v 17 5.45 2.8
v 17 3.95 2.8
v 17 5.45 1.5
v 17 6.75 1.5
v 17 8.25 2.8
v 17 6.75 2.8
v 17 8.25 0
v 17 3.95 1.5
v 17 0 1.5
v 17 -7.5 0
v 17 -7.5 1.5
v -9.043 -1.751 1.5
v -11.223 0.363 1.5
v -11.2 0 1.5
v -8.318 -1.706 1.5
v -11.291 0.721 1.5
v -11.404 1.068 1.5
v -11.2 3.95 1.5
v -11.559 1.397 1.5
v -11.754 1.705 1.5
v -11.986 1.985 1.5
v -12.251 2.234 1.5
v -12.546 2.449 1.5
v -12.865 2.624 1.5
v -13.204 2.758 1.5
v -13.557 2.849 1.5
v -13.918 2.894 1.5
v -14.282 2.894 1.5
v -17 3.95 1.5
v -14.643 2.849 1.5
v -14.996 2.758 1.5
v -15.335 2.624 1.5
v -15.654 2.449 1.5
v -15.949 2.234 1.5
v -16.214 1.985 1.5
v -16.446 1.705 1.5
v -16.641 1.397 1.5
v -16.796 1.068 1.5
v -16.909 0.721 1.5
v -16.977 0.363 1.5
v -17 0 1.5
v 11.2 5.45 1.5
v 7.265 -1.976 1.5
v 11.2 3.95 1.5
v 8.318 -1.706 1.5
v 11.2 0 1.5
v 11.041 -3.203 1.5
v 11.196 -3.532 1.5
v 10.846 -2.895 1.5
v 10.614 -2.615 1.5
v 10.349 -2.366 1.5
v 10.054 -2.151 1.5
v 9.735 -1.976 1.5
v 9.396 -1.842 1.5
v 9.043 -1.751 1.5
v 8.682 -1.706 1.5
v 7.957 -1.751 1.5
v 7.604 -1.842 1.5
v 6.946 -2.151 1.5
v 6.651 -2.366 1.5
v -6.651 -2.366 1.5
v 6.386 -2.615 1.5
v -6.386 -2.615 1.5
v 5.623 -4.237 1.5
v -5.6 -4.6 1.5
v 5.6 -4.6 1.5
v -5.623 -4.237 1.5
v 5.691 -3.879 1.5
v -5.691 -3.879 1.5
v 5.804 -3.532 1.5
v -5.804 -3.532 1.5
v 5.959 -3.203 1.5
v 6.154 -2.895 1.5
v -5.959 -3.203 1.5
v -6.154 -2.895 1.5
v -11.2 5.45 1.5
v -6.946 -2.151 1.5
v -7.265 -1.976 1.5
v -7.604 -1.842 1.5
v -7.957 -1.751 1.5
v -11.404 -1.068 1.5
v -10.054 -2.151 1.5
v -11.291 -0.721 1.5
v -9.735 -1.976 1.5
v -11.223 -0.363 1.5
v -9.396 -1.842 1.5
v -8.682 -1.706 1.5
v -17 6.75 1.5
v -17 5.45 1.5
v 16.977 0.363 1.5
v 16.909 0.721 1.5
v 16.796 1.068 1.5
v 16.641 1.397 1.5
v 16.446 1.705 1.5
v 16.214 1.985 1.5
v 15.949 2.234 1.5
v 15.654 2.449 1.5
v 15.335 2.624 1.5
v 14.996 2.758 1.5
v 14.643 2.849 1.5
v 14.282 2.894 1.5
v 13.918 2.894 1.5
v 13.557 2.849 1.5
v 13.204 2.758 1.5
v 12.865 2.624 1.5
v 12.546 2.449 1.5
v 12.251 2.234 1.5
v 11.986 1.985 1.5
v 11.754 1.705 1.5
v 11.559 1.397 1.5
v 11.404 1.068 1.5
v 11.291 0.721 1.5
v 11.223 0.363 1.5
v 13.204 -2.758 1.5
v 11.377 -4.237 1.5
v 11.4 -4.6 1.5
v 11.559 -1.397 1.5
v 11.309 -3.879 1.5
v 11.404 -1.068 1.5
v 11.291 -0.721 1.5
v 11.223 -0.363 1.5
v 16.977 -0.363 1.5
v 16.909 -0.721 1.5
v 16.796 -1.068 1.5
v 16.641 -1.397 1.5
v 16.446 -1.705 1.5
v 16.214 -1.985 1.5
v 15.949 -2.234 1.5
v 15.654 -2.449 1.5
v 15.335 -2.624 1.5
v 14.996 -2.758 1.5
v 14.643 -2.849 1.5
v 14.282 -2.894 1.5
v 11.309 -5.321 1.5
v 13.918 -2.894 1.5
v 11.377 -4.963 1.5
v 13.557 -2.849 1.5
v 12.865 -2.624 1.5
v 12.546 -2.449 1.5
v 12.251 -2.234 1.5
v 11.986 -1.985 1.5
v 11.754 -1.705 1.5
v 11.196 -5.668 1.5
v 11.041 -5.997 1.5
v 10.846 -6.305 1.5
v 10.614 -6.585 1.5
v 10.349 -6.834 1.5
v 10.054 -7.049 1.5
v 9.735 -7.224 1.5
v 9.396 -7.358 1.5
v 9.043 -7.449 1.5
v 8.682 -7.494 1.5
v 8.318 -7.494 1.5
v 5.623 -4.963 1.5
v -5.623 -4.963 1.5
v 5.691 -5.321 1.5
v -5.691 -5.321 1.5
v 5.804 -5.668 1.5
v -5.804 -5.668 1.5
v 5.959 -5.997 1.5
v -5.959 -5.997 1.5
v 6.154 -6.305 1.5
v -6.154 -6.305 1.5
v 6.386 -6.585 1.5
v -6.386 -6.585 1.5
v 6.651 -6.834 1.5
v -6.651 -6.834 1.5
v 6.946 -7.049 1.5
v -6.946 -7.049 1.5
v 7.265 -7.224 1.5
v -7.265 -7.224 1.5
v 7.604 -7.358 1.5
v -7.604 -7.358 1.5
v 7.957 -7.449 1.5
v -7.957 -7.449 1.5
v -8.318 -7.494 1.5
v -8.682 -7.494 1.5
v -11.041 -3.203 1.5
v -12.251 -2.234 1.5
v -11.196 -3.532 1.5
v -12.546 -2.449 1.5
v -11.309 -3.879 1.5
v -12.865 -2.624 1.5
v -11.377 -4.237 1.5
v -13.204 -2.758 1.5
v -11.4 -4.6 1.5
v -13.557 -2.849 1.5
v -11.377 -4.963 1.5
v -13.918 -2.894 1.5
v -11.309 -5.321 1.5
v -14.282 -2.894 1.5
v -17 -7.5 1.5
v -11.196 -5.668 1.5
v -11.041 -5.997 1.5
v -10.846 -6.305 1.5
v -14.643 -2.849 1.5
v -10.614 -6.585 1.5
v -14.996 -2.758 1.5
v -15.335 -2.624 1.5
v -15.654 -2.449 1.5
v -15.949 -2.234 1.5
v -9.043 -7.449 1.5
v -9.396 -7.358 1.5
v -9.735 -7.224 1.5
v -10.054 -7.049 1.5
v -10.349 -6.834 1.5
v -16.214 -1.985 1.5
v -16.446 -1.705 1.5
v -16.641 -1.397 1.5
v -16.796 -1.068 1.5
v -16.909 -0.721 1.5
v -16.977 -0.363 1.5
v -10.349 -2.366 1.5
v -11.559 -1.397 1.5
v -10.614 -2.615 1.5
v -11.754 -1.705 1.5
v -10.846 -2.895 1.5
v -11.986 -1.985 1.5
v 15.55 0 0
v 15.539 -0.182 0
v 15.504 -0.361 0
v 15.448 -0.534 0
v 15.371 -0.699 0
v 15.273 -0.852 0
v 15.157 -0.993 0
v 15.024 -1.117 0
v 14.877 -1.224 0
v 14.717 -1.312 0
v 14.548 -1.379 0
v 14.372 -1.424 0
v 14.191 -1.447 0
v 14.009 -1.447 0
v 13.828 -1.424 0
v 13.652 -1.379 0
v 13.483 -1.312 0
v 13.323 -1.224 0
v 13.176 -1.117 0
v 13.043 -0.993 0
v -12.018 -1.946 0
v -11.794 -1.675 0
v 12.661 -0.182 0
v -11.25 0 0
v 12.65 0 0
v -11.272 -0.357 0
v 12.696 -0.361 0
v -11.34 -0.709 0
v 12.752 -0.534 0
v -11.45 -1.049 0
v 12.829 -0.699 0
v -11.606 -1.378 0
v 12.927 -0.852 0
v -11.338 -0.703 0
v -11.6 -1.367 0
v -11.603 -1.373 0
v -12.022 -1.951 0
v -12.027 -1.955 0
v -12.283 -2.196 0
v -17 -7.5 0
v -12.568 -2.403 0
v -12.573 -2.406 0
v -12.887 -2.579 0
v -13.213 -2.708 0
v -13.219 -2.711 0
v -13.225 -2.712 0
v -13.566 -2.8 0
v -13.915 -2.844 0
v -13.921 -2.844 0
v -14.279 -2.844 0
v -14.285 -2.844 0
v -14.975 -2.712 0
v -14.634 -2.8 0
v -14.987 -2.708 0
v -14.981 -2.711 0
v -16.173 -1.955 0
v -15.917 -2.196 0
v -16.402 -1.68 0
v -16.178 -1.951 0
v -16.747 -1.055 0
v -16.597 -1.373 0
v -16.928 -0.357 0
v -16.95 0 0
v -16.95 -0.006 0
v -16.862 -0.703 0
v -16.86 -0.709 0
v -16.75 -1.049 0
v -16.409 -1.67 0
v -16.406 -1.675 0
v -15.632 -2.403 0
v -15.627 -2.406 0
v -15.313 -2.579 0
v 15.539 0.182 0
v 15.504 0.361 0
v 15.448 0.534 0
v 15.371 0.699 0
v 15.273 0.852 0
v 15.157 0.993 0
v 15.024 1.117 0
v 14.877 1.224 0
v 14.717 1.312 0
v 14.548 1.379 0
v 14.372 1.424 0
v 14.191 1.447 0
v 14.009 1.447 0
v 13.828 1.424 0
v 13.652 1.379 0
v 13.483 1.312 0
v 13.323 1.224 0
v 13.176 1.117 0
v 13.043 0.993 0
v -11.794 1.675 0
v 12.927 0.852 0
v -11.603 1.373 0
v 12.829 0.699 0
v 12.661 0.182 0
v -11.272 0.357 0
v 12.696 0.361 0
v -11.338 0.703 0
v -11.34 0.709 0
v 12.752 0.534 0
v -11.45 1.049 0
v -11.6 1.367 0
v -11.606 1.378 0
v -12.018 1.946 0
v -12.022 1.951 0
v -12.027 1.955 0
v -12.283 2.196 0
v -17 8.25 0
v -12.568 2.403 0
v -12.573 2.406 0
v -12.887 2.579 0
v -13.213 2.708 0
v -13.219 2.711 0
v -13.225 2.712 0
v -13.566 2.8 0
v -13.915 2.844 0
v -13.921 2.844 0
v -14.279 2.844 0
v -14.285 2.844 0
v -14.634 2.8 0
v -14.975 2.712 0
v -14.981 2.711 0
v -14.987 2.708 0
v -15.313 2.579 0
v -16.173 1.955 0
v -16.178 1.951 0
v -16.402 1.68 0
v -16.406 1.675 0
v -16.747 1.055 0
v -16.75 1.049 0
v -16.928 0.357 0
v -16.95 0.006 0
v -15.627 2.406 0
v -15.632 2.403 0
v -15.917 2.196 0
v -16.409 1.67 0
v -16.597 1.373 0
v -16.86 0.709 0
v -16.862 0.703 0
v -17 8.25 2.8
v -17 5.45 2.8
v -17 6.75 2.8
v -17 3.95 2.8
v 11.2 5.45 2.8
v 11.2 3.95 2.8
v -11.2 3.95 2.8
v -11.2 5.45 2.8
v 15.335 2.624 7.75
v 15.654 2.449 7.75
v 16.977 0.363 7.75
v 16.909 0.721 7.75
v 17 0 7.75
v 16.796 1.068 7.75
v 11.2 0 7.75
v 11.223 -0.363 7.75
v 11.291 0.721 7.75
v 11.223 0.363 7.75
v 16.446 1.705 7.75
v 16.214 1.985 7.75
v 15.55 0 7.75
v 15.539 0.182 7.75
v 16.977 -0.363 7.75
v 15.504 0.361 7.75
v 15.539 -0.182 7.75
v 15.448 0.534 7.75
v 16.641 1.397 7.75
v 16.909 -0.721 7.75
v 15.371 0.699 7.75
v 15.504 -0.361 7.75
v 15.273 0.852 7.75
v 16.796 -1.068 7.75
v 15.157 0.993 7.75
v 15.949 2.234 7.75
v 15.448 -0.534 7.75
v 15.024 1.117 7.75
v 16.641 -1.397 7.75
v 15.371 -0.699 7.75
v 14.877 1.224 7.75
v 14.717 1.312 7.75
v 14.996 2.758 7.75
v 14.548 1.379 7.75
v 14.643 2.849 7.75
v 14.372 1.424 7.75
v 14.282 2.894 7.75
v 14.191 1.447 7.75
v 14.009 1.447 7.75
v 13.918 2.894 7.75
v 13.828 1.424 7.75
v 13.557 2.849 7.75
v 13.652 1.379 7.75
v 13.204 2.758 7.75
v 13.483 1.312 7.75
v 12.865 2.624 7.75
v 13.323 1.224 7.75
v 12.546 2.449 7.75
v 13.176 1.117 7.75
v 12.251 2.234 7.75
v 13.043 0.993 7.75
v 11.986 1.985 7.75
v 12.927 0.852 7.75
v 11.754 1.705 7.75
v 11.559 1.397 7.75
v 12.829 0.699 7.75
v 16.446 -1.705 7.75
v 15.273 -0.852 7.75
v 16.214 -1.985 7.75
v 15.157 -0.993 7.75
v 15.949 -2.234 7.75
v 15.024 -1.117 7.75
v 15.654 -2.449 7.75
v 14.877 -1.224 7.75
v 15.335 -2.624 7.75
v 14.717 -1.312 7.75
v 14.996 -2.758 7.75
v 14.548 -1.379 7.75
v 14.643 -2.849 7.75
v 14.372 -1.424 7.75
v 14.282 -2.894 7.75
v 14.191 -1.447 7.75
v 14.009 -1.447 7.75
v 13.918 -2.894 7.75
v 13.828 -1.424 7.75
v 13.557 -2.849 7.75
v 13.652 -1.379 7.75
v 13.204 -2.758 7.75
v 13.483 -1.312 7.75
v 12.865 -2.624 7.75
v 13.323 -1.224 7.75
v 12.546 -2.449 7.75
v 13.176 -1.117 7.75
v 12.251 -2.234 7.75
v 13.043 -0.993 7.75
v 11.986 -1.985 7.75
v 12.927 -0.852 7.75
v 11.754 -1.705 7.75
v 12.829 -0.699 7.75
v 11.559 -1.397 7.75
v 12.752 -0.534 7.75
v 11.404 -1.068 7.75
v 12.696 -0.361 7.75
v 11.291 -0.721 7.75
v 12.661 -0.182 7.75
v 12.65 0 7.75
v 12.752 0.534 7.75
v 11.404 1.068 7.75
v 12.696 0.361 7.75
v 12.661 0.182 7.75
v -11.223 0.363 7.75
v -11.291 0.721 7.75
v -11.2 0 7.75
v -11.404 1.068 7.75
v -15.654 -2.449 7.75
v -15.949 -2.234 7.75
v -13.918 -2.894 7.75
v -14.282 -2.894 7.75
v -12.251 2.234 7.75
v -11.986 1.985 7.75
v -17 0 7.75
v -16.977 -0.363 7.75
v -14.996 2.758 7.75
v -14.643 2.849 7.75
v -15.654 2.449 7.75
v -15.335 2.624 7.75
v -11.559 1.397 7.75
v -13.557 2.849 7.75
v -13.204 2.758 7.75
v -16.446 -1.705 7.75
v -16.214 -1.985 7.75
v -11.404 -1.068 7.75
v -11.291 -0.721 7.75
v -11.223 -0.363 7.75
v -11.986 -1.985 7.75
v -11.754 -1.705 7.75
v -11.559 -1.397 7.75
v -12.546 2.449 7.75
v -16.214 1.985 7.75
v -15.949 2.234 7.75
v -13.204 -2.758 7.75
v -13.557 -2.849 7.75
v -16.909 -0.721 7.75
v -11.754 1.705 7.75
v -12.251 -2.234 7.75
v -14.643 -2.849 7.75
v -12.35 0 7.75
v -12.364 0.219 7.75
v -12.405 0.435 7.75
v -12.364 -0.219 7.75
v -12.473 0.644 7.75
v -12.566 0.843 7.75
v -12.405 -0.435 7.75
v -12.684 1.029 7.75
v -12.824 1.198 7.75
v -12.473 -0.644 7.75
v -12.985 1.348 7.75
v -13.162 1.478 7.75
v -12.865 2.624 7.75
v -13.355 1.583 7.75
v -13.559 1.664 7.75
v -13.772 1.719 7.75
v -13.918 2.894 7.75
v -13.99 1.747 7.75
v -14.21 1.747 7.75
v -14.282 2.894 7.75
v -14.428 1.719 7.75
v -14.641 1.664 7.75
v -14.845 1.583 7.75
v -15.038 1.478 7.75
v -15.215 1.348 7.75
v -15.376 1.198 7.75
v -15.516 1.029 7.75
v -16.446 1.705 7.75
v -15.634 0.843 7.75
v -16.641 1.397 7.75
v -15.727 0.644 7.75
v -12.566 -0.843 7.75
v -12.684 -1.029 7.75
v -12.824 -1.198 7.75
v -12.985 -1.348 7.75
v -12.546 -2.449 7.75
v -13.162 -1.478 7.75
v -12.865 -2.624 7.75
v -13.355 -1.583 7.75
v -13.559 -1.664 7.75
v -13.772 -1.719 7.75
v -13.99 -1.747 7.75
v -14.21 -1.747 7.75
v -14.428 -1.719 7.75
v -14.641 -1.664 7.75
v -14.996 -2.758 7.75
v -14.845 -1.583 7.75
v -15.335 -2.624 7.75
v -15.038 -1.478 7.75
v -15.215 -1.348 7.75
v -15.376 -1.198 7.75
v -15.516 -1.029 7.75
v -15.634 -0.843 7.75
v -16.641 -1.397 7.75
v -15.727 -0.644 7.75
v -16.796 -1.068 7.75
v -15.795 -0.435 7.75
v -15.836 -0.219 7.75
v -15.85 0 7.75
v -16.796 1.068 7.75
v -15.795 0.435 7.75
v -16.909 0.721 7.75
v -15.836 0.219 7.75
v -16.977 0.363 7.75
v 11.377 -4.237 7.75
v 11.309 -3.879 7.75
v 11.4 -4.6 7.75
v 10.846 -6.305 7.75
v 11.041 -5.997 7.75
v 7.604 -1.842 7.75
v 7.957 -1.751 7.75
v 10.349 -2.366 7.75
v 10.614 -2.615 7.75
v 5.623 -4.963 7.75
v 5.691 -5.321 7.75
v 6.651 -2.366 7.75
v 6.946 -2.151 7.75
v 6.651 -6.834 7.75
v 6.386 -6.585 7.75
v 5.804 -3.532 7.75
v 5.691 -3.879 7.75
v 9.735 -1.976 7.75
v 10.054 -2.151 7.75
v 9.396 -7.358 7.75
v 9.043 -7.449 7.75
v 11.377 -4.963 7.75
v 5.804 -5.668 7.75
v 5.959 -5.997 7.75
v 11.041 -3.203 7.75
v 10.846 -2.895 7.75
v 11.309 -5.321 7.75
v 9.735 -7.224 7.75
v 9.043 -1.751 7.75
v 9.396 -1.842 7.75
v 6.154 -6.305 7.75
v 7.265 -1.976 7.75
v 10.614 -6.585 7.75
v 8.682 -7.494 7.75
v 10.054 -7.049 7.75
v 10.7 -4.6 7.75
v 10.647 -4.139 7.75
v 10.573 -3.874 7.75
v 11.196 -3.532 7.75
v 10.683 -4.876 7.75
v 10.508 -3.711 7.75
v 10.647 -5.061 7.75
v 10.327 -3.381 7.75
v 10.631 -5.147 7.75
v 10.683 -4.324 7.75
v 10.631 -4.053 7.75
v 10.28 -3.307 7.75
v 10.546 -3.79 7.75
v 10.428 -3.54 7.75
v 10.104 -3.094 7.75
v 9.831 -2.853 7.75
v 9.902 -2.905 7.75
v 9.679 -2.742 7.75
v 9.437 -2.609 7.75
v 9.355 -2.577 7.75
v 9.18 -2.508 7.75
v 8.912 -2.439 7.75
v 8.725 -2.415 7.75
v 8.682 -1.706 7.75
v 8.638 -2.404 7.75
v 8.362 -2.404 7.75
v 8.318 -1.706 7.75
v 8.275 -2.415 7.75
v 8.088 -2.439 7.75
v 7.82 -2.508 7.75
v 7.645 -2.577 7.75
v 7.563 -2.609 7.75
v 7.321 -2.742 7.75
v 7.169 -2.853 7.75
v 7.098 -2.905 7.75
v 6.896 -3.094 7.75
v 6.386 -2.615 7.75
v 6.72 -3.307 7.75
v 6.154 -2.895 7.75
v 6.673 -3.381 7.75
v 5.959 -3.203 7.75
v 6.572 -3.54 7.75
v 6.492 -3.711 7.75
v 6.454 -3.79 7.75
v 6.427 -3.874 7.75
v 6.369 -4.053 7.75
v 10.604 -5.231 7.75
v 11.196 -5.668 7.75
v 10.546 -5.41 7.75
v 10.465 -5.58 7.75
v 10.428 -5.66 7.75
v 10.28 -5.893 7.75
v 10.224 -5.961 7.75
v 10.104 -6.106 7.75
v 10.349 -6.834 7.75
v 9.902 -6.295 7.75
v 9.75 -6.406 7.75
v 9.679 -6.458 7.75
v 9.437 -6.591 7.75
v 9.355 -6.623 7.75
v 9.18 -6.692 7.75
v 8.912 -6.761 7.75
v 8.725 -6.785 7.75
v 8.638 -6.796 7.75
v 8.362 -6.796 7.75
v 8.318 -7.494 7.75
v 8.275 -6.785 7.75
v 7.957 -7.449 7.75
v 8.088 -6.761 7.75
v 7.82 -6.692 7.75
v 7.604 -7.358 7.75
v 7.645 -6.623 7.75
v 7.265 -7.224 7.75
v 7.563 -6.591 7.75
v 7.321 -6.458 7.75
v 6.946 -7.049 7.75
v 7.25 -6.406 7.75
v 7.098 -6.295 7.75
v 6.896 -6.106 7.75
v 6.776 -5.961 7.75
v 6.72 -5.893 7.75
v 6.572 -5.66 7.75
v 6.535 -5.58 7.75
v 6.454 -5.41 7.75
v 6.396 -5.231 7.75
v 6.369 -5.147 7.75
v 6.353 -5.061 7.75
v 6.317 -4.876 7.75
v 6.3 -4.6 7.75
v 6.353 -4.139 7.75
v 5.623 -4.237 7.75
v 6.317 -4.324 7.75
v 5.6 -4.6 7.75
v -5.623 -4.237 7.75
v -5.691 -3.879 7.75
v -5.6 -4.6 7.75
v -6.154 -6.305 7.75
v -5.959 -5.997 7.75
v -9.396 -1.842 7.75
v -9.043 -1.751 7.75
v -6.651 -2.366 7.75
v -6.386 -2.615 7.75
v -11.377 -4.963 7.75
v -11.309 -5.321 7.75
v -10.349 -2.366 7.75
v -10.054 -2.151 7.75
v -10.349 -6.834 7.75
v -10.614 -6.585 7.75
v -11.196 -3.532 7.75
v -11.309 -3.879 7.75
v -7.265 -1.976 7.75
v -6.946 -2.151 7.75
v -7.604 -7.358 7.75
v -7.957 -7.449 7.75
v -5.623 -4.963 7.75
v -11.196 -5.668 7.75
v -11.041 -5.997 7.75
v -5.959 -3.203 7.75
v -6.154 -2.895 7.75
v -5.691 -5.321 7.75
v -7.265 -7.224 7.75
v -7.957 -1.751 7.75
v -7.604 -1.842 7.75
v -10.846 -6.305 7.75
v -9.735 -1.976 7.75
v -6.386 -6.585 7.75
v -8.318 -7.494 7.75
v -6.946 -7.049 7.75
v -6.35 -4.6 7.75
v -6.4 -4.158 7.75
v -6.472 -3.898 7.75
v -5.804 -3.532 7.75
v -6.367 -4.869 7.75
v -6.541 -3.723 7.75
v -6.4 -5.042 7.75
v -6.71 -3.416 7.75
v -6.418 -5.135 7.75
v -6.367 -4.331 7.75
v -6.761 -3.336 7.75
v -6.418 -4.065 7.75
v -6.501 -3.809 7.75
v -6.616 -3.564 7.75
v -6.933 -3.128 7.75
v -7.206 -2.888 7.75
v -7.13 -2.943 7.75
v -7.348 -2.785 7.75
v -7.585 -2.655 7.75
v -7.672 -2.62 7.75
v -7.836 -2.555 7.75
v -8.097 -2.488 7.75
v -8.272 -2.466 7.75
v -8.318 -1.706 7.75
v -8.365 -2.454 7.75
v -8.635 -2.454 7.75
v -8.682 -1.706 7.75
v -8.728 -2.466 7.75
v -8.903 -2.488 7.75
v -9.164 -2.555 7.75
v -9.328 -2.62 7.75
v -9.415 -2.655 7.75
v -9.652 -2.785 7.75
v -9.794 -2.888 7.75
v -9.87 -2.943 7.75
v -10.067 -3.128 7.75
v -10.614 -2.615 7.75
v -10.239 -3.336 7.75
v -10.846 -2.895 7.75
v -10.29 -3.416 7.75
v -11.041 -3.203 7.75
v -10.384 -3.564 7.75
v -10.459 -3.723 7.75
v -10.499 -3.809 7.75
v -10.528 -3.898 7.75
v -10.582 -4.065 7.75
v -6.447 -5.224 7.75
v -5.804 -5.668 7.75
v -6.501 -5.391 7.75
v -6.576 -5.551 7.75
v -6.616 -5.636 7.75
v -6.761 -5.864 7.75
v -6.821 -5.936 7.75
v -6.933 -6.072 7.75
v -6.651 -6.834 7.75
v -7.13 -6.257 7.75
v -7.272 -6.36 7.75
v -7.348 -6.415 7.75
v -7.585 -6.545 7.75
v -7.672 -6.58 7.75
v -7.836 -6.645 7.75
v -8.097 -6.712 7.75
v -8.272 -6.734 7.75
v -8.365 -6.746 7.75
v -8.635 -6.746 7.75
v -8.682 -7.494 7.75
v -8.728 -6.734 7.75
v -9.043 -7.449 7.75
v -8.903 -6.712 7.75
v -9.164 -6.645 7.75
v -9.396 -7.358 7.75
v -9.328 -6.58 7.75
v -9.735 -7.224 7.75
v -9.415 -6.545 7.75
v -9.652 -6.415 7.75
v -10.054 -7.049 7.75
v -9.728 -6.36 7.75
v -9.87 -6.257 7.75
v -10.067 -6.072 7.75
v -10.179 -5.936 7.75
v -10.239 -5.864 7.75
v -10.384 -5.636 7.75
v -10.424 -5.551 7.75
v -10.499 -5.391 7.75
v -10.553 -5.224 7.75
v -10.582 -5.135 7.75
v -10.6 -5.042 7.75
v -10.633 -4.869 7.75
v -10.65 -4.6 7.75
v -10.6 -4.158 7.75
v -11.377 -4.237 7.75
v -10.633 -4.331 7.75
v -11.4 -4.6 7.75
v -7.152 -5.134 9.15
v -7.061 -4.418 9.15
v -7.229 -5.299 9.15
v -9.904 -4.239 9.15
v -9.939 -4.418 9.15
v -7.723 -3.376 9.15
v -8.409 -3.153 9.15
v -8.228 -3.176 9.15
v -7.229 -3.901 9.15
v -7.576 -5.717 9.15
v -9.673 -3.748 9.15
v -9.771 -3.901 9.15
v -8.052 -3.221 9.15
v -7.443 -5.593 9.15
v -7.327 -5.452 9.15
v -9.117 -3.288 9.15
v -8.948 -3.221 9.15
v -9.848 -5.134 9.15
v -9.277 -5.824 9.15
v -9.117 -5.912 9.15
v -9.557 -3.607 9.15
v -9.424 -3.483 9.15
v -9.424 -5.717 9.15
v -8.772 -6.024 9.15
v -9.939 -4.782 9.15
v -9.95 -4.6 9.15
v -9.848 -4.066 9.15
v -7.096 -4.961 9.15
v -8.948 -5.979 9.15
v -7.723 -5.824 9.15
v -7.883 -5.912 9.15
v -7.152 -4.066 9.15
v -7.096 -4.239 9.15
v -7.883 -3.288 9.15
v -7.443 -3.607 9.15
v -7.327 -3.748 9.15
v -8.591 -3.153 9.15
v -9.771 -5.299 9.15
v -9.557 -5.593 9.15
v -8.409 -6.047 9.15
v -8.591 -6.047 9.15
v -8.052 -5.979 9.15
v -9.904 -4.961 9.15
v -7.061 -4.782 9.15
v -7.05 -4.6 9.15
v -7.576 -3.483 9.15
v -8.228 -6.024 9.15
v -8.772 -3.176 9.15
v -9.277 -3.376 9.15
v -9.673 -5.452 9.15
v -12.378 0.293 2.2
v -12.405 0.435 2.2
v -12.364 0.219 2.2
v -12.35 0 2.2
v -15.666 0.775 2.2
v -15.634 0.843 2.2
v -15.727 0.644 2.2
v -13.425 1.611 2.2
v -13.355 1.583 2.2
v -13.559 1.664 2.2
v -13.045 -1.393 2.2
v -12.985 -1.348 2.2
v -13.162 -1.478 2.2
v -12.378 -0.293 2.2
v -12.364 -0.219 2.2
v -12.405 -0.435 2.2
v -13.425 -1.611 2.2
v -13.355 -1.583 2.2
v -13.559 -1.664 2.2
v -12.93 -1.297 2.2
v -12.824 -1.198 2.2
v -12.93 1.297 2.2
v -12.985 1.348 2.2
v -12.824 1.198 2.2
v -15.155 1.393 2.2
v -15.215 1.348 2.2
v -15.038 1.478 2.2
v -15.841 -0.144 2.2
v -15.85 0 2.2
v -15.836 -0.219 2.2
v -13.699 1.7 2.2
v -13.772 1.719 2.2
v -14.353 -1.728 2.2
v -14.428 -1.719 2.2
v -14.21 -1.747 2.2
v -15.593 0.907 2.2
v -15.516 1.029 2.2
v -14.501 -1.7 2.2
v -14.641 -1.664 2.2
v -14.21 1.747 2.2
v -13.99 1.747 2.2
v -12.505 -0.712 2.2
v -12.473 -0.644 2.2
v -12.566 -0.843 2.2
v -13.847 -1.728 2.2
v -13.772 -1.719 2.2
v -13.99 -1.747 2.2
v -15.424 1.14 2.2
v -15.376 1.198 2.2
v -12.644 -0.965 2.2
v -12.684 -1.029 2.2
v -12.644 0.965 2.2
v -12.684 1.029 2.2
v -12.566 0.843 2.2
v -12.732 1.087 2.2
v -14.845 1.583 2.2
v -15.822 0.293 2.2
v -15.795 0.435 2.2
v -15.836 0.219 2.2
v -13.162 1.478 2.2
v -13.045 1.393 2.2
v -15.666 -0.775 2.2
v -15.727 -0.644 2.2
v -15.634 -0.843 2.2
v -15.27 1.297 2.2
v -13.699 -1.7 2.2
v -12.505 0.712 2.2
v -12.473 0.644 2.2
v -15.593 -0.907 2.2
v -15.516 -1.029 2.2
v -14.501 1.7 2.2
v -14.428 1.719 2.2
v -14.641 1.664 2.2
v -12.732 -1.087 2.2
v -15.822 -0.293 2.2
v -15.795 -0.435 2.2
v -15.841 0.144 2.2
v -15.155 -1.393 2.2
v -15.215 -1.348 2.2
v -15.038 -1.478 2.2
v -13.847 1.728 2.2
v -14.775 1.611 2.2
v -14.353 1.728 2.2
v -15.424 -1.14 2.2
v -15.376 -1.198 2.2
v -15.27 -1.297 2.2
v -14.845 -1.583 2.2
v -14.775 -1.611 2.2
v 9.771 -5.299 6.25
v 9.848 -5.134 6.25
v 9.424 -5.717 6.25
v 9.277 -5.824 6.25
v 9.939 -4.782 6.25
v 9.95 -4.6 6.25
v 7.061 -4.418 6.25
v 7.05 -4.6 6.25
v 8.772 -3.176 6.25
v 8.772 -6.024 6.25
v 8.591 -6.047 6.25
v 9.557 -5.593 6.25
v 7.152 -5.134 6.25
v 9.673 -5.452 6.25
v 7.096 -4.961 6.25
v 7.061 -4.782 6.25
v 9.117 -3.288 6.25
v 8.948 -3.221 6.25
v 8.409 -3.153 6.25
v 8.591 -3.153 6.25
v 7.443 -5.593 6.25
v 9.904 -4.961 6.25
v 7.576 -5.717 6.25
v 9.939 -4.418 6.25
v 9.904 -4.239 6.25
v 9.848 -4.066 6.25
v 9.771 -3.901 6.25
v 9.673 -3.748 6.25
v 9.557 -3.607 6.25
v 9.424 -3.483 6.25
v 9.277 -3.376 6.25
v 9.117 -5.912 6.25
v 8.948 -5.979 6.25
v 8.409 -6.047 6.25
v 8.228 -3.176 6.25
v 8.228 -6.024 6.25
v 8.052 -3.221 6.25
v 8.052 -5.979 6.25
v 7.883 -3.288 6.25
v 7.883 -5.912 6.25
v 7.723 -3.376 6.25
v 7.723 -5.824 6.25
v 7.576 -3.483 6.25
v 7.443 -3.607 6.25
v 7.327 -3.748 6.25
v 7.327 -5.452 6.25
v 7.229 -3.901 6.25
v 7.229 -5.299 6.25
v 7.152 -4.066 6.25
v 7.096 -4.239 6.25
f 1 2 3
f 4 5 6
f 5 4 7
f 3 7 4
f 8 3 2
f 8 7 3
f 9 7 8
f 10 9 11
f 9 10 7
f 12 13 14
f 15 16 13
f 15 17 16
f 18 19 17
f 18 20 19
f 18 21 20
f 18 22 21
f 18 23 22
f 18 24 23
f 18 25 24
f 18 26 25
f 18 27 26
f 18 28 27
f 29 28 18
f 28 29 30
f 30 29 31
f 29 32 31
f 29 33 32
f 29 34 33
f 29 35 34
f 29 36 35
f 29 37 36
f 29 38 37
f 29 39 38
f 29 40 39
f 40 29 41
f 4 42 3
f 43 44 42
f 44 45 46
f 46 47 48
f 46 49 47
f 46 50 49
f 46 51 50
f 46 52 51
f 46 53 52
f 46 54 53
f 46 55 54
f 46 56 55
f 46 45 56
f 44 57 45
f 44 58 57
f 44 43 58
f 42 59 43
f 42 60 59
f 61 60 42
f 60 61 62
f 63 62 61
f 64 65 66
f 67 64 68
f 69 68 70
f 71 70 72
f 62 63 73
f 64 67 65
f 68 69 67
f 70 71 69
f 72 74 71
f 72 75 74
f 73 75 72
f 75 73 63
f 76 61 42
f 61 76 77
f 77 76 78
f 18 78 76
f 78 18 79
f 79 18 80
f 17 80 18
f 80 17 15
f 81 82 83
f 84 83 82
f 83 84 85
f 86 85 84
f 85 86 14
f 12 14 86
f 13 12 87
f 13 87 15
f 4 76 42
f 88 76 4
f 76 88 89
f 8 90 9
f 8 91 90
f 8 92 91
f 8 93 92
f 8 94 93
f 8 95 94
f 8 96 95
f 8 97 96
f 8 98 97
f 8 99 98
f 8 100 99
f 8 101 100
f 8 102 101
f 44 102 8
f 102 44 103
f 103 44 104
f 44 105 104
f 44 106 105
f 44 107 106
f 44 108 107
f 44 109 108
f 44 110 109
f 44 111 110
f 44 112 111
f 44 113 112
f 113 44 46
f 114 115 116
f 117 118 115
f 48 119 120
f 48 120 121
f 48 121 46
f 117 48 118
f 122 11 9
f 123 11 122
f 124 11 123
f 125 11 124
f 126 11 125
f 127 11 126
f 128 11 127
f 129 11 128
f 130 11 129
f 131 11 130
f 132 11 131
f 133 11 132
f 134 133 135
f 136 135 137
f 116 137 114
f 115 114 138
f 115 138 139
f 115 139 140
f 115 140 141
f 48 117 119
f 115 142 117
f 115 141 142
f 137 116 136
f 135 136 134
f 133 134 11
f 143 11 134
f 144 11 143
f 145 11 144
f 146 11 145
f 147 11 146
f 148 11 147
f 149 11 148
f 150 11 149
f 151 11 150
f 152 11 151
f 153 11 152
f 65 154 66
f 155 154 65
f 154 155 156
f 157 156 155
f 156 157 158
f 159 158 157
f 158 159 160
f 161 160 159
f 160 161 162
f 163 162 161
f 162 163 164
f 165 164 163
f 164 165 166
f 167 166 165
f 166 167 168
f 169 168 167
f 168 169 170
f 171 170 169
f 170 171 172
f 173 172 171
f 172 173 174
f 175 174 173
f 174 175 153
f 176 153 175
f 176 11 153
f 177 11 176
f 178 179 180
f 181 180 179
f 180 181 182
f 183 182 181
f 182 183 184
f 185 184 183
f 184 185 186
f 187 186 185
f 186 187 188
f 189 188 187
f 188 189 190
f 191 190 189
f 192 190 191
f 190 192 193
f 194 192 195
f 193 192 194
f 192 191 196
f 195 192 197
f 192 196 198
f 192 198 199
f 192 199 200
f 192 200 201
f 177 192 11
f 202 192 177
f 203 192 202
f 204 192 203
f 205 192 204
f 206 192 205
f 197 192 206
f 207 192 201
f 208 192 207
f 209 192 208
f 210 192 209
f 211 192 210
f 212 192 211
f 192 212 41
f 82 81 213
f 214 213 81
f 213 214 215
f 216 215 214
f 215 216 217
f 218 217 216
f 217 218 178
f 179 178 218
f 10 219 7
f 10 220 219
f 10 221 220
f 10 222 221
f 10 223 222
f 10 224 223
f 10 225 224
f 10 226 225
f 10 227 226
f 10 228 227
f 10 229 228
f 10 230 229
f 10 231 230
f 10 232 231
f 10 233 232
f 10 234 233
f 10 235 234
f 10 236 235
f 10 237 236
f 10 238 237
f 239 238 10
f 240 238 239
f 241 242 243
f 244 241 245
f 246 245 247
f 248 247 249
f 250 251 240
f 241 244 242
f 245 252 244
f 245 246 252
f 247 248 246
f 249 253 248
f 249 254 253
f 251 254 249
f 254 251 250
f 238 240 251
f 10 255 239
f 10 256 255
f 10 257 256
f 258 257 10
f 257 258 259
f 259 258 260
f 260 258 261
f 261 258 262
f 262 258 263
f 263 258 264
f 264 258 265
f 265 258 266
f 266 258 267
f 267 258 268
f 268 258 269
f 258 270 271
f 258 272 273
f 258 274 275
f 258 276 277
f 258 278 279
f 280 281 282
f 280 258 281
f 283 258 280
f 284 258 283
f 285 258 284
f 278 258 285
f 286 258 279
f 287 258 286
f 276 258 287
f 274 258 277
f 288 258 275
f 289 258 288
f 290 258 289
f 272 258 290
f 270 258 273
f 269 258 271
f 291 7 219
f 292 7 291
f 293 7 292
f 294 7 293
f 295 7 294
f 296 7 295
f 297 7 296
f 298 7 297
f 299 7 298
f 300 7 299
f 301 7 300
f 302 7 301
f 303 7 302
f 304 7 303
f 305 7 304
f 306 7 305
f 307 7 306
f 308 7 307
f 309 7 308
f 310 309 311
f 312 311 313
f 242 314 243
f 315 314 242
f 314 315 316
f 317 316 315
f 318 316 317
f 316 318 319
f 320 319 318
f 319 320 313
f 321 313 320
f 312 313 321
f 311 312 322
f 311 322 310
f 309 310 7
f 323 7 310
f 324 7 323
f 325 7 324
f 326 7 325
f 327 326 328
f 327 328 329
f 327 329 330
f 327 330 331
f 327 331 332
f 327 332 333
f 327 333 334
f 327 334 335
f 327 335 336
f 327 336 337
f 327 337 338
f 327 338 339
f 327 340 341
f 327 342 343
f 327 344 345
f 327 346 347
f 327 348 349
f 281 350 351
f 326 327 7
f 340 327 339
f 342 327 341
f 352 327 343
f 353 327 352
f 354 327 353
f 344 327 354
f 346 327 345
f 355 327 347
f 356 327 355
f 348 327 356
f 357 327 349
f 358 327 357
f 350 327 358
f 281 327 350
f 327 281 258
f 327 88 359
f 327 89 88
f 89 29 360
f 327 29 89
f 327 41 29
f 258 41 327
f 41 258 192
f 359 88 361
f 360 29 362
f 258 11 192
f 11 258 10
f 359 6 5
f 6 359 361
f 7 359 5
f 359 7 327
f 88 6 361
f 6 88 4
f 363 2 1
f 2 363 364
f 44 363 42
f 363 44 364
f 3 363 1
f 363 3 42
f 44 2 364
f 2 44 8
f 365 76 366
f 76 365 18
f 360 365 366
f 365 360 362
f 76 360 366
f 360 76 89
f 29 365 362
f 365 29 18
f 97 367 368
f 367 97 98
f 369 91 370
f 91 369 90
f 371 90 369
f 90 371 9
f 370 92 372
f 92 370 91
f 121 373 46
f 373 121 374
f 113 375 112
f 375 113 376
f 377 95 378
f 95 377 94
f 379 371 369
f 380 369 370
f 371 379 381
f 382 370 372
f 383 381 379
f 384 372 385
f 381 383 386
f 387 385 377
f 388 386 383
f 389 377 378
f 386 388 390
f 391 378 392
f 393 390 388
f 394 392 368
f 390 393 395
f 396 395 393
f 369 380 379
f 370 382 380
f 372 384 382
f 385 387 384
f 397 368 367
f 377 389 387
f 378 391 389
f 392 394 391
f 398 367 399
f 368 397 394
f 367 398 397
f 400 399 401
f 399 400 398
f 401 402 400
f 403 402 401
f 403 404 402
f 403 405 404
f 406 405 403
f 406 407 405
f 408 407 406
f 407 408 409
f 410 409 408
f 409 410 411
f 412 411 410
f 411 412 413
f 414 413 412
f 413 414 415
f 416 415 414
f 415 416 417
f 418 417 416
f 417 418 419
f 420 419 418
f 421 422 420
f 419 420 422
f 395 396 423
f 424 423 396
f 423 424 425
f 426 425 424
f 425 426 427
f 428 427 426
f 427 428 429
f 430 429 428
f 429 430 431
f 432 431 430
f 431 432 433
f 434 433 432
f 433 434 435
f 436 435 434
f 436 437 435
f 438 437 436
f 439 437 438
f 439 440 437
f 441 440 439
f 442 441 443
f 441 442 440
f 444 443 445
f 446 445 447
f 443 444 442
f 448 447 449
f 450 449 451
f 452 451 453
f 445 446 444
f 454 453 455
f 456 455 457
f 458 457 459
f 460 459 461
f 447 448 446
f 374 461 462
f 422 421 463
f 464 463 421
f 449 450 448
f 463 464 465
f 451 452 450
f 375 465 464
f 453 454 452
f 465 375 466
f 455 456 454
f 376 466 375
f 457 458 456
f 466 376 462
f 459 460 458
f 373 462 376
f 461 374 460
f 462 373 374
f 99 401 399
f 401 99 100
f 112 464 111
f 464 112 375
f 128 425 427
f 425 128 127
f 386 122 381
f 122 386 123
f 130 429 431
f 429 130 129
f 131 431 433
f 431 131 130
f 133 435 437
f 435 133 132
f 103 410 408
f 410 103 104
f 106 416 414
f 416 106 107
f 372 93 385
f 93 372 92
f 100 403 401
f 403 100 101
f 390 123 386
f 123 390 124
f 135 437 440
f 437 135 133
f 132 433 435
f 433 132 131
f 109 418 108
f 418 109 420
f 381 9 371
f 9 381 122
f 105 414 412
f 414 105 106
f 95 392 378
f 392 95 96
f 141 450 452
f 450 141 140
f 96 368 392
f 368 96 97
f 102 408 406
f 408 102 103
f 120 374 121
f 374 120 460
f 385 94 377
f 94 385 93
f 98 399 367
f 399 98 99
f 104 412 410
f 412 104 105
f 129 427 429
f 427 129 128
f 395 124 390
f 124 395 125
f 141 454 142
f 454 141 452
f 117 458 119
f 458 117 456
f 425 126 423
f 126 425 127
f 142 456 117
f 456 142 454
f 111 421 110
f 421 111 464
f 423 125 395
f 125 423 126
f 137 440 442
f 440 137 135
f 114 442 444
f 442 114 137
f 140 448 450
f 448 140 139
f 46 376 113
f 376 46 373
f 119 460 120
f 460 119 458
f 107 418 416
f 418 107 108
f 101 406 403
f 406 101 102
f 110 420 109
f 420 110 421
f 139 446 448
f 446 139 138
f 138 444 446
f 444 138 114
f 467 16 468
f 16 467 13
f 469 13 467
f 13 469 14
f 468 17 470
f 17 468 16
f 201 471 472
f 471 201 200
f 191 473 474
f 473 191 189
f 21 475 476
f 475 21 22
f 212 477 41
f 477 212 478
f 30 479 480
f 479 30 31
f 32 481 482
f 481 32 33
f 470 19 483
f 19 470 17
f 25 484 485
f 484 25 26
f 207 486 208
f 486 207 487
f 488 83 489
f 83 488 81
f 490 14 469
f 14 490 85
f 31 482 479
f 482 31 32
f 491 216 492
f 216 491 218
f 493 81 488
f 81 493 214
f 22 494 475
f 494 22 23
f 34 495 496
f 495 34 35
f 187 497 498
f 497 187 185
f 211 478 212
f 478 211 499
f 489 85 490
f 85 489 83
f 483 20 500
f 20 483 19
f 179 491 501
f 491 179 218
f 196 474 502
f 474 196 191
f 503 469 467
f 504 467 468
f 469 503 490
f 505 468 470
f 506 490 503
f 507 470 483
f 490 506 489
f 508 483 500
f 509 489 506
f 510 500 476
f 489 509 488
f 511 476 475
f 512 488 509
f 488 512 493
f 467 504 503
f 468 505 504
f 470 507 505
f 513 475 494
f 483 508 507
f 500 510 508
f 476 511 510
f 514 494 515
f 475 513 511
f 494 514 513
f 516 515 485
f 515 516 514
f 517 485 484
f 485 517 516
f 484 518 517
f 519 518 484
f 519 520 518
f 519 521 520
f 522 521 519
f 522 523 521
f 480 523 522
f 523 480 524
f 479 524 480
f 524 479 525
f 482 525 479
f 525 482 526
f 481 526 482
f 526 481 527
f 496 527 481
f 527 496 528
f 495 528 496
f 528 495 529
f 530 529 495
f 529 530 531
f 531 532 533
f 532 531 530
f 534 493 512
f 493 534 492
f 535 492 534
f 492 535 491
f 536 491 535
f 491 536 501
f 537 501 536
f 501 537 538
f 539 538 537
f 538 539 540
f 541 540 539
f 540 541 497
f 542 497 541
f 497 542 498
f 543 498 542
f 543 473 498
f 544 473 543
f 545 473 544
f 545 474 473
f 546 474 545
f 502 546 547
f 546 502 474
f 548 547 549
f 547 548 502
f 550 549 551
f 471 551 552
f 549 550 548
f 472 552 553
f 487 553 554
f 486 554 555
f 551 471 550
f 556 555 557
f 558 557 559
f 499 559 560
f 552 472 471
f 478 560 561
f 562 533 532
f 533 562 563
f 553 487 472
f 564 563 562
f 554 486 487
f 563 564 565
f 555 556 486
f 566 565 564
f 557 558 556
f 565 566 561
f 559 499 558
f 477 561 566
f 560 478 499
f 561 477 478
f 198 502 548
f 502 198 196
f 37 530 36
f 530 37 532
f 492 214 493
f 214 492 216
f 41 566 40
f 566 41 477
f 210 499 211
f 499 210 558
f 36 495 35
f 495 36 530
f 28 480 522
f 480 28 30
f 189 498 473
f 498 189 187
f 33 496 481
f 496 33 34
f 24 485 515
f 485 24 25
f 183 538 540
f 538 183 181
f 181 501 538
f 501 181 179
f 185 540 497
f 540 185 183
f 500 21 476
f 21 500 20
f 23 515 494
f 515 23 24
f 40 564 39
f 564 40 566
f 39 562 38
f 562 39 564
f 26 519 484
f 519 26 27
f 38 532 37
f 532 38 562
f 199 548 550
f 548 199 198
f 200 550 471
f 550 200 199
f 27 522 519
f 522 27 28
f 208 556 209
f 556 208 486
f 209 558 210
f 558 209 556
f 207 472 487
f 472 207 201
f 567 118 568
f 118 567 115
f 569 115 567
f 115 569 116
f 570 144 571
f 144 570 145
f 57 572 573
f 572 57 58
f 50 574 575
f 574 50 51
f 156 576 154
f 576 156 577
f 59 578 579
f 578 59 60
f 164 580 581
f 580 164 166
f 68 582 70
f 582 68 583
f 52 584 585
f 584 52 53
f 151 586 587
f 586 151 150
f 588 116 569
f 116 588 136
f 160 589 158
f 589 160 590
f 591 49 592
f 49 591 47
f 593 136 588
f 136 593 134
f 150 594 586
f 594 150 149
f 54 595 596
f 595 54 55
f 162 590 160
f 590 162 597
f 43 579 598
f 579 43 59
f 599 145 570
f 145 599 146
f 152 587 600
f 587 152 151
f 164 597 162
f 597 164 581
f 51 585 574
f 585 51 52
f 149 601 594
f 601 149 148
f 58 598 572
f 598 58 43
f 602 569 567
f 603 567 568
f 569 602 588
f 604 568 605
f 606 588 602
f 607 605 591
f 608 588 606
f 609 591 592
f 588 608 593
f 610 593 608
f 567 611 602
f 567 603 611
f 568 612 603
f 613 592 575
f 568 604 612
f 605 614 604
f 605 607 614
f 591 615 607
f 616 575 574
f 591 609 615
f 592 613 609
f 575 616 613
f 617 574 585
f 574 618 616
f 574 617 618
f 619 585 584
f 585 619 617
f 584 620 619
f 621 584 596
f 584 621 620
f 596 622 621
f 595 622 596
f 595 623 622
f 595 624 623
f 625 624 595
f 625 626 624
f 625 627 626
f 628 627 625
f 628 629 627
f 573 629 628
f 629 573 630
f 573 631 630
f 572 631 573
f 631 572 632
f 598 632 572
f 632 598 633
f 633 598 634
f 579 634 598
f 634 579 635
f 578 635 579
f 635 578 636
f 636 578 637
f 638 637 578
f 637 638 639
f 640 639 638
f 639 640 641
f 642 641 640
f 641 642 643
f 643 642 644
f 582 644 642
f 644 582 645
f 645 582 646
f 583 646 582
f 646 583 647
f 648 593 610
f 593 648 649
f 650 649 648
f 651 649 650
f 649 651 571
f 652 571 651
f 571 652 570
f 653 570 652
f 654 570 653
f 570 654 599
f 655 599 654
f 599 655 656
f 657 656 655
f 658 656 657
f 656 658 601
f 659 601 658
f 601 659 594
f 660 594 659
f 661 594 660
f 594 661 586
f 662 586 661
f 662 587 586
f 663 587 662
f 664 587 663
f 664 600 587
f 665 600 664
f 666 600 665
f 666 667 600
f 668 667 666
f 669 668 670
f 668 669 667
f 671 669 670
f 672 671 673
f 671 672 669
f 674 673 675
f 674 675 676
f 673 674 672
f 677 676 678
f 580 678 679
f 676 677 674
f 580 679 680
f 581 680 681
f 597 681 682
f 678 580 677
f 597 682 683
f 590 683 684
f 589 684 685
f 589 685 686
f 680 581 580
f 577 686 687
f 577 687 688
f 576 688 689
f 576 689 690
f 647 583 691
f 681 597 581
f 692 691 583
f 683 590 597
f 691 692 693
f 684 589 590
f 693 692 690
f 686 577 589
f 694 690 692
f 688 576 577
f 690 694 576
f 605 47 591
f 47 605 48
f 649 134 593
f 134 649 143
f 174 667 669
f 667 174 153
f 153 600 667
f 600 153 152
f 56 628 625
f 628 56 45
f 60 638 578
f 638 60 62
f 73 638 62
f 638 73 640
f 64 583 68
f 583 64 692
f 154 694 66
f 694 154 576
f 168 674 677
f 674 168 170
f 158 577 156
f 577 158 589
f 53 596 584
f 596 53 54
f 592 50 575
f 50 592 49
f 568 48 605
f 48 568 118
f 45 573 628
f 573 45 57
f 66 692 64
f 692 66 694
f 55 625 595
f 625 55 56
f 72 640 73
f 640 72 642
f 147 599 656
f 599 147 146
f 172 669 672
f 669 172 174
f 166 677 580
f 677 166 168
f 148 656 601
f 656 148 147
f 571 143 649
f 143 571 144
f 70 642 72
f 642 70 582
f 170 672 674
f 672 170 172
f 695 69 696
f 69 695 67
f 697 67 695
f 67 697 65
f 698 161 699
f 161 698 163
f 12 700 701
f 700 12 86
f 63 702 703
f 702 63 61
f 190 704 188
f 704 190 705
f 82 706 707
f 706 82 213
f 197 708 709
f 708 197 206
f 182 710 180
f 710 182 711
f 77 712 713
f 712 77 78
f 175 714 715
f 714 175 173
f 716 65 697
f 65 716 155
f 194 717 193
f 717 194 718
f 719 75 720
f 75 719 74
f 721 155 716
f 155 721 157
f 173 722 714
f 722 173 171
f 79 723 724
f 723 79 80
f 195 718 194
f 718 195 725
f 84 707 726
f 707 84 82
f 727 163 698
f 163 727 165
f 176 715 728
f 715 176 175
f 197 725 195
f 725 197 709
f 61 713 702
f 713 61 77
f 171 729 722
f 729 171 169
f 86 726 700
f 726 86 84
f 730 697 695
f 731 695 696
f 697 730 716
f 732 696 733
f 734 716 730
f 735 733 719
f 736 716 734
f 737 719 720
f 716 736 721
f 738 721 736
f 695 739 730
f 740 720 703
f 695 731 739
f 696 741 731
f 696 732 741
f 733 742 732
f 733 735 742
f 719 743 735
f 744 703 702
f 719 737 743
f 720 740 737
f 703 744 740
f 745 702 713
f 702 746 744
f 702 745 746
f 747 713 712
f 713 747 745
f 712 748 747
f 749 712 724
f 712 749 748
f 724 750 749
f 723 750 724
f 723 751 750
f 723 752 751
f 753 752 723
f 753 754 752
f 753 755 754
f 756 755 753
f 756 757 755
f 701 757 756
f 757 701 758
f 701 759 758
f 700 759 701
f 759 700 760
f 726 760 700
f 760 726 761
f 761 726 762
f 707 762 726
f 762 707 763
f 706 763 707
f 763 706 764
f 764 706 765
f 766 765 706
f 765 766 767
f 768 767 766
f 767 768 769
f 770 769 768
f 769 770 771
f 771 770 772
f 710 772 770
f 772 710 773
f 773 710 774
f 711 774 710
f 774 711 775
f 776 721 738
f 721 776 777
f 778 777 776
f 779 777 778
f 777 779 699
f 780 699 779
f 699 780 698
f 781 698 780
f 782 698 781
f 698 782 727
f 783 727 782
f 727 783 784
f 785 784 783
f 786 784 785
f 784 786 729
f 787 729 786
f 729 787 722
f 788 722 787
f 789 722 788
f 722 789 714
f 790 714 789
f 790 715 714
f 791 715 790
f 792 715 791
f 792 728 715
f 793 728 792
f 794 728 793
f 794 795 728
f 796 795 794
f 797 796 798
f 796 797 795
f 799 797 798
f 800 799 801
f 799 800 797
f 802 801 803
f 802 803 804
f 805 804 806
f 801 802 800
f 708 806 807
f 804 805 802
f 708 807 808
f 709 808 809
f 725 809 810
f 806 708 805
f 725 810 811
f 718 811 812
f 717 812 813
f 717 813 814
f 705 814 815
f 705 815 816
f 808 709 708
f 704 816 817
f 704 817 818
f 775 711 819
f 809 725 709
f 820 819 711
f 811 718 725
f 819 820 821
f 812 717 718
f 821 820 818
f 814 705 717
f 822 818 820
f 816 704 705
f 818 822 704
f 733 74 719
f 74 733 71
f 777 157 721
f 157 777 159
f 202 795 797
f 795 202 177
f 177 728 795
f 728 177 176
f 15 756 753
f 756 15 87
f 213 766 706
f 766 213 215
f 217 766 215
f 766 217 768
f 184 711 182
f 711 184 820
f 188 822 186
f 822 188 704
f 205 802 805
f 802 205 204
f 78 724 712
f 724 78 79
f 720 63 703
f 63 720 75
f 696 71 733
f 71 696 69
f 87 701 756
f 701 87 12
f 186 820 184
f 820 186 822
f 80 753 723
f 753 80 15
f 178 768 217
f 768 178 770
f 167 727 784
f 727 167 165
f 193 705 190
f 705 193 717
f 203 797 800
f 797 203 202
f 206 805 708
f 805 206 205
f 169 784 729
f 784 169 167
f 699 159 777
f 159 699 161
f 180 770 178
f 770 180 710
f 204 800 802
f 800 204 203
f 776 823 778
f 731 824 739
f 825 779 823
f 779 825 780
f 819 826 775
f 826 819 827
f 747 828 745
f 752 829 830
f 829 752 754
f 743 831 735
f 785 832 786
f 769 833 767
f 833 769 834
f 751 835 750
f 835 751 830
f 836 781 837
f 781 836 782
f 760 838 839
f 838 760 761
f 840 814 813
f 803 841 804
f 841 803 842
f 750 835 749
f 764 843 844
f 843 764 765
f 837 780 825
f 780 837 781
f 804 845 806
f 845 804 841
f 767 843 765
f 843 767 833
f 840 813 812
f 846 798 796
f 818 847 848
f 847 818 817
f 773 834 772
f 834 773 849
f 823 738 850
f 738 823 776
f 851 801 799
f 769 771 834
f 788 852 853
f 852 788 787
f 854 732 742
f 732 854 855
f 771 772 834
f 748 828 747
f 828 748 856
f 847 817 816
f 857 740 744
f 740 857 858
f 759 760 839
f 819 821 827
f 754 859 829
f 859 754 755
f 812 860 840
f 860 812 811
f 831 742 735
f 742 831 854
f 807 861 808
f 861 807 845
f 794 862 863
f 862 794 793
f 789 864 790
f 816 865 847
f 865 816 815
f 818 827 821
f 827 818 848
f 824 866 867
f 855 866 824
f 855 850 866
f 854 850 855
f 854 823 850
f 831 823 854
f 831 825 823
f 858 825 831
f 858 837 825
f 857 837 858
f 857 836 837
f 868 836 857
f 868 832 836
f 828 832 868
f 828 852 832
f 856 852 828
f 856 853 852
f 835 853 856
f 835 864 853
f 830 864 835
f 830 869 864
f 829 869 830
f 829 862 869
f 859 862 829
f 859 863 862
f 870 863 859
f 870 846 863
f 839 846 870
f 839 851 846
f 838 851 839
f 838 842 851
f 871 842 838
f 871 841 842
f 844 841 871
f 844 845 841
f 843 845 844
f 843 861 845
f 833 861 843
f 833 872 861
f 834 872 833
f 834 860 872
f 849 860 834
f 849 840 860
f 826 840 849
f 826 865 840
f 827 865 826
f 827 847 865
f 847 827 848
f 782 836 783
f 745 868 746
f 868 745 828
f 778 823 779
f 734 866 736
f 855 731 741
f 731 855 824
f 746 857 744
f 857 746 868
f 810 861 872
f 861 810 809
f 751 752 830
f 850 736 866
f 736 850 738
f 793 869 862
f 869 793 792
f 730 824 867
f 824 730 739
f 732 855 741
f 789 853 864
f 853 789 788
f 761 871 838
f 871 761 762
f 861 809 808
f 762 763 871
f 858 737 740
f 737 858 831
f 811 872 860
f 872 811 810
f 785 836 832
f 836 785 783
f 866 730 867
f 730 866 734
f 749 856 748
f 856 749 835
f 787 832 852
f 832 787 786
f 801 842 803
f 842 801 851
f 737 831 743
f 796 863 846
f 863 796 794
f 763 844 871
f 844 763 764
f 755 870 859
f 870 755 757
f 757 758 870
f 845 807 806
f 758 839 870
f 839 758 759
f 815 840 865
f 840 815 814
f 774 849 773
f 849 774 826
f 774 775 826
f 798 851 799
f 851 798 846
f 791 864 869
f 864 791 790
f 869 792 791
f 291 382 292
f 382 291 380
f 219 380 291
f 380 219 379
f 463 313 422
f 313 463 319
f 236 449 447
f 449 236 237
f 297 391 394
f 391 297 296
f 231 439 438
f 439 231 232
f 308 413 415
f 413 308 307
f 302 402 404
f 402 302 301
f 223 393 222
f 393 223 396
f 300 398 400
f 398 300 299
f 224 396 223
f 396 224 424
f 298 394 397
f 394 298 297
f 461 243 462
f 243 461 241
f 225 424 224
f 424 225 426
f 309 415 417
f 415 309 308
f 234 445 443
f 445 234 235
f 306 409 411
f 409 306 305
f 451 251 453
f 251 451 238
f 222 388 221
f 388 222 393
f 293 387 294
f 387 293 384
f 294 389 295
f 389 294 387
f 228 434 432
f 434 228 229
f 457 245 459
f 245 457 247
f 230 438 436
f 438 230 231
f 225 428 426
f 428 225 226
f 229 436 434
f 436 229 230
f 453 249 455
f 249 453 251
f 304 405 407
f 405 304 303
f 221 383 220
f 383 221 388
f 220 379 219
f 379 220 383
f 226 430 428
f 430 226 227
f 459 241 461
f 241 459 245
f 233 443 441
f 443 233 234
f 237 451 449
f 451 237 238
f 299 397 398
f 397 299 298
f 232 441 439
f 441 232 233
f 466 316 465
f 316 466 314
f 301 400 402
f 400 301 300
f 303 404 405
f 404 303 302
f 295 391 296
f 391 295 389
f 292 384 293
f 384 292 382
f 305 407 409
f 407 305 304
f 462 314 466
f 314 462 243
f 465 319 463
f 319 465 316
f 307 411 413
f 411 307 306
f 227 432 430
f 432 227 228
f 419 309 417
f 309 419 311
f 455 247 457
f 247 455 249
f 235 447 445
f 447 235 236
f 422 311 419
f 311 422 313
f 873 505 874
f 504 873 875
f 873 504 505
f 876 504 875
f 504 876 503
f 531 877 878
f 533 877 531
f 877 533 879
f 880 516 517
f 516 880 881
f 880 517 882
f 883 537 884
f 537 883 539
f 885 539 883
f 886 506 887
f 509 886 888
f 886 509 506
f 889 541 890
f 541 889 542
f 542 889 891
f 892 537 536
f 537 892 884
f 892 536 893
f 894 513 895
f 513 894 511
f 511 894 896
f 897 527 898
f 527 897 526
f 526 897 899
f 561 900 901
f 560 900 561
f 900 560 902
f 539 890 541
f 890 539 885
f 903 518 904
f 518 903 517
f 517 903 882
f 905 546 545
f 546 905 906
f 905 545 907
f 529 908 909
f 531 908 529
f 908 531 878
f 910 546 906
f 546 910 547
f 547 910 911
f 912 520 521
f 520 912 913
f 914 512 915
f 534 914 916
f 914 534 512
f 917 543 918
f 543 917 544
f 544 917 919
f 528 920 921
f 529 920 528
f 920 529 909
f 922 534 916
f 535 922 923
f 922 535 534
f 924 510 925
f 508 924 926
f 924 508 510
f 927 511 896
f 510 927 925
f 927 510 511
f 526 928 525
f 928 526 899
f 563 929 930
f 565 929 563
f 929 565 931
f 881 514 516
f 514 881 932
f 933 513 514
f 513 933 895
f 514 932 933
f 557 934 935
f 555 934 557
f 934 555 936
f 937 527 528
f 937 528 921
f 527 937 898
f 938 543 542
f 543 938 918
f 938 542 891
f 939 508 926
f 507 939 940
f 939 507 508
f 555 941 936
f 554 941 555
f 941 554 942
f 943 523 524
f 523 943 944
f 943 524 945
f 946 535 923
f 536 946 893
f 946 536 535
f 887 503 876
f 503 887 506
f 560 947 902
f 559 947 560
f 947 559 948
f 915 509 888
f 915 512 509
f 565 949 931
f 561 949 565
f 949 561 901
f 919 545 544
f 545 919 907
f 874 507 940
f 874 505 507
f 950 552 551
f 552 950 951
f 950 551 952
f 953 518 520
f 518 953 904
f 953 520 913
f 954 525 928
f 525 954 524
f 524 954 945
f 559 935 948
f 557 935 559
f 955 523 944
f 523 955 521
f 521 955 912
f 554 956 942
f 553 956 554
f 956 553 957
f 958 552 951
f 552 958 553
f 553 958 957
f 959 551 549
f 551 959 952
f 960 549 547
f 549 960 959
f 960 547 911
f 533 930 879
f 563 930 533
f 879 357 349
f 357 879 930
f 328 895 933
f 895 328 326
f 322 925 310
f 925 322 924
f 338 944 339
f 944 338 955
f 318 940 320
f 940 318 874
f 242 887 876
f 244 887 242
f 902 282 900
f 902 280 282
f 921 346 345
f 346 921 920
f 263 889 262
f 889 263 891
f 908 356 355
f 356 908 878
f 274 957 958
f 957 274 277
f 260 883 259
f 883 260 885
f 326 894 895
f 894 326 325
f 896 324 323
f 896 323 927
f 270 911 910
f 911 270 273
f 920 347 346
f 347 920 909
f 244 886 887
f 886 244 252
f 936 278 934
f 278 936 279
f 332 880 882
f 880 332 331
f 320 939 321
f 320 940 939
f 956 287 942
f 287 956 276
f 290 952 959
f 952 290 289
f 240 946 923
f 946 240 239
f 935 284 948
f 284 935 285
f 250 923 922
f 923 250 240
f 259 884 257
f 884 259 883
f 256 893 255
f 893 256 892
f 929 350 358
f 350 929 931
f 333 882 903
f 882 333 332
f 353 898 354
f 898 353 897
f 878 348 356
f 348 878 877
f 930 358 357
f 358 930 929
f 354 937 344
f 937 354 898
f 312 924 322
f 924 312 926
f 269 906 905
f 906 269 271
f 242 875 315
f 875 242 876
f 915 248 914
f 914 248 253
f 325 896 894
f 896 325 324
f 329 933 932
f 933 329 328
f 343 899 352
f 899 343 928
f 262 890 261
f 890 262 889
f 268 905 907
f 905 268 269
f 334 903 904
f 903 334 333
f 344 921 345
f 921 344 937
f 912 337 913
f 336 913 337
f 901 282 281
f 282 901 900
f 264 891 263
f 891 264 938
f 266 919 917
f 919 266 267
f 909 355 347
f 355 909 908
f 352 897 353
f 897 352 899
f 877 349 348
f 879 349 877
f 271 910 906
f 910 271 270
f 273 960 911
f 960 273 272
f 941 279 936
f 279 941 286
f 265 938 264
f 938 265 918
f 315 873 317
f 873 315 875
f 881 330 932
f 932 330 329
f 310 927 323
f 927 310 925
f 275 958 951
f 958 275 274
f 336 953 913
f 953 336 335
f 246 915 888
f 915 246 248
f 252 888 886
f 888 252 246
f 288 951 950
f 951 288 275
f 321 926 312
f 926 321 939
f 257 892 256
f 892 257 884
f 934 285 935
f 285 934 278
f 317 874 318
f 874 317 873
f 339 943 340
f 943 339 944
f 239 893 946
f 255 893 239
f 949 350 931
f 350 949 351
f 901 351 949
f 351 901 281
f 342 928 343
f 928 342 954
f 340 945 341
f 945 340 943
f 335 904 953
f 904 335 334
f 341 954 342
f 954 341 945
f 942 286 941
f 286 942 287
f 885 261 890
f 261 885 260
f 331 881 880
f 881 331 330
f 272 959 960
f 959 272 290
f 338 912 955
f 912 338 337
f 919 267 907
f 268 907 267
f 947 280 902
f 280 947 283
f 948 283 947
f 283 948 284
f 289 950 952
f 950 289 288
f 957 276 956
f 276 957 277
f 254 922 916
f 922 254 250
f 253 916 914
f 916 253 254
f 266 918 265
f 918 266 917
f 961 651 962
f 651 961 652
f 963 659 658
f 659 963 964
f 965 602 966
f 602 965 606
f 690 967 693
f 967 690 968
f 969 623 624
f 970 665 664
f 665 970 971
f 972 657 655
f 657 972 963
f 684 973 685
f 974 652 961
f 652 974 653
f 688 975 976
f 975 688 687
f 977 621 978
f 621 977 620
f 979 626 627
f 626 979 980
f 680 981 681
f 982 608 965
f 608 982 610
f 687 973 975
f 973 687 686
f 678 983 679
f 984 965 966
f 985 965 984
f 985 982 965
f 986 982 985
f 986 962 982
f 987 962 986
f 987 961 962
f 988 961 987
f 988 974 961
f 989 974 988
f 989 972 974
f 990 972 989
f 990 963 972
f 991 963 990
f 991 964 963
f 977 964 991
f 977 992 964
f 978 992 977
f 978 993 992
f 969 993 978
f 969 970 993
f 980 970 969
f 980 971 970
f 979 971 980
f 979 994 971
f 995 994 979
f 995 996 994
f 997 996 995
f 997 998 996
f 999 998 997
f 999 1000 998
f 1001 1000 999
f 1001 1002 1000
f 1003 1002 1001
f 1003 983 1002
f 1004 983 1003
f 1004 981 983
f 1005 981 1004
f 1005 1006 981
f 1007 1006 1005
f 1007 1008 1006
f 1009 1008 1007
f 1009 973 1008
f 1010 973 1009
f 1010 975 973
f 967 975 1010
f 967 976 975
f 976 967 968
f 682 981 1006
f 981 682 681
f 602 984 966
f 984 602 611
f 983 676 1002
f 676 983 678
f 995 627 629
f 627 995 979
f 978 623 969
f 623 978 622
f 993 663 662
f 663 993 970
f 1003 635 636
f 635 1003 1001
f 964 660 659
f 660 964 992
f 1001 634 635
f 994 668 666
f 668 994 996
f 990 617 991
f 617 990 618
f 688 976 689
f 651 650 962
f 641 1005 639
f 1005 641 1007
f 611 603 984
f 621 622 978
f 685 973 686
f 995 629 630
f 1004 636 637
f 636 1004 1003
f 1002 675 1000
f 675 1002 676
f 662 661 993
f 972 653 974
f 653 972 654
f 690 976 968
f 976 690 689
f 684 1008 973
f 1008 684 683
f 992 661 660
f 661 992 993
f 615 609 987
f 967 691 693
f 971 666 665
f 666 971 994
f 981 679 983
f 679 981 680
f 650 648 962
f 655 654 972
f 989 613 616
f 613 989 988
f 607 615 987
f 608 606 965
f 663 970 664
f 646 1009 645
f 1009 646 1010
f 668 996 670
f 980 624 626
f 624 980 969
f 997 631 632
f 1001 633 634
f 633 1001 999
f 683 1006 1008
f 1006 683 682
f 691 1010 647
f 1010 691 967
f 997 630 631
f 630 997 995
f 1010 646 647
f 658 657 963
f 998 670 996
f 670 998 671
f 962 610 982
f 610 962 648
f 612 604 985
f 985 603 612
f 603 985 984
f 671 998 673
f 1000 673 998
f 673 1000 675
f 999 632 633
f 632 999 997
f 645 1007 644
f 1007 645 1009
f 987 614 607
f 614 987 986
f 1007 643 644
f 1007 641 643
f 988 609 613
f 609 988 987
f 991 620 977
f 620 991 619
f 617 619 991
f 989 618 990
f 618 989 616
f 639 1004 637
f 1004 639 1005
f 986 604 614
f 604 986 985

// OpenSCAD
$fn=50;
ts=1.5;


plt=[31+3, 12.5, 1.3];
kr=15;
otv=2.9;


difference(){
    union(){
        translate([0,0,ts/2])cube([ plt.x,kr, ts],true);
        translate([0,kr/2,(plt.z+ts)/2])cube([ plt.x,ts,plt.z+ts],true);
        translate([plt.x/2-otv,kr/2-ts-plt.z,(plt.z+ts)/2])cube([ otv*2,ts,plt.z+ts],true);
        translate([-(plt.x/2-otv),kr/2-ts-plt.z,(plt.z+ts)/2])cube([ otv*2,ts,plt.z+ts],true);
        translate([plt.x/2-otv,0,0])cylinder(plt.y/2+ts,otv,otv);
        translate([-(plt.x/2-otv),0,0])cylinder(plt.y/2+ts,otv,otv);
        translate([plt.x/4,otv-kr/2,0])cylinder(plt.y/2+ts,otv,otv);
        translate([-(plt.x/4),otv-kr/2,0])cylinder(plt.y/2+ts,otv,otv);
        translate([-(plt.x/4),otv-kr/2,plt.y/2])cylinder(otv,otv,otv/2);
    }
    translate([plt.x/2-otv,0,-0.1])cylinder(plt.y,otv/2,otv/2);
    translate([-(plt.x/2-otv),0,-0.1])cylinder(plt.y,otv/2+0.3,otv/2+0.3);
    translate([-(plt.x/2-otv),0,-0.1])cylinder(otv,otv,otv/2);
    translate([(plt.x/4),otv-kr/2,plt.y/2])cylinder(otv,otv/2,otv);
}
